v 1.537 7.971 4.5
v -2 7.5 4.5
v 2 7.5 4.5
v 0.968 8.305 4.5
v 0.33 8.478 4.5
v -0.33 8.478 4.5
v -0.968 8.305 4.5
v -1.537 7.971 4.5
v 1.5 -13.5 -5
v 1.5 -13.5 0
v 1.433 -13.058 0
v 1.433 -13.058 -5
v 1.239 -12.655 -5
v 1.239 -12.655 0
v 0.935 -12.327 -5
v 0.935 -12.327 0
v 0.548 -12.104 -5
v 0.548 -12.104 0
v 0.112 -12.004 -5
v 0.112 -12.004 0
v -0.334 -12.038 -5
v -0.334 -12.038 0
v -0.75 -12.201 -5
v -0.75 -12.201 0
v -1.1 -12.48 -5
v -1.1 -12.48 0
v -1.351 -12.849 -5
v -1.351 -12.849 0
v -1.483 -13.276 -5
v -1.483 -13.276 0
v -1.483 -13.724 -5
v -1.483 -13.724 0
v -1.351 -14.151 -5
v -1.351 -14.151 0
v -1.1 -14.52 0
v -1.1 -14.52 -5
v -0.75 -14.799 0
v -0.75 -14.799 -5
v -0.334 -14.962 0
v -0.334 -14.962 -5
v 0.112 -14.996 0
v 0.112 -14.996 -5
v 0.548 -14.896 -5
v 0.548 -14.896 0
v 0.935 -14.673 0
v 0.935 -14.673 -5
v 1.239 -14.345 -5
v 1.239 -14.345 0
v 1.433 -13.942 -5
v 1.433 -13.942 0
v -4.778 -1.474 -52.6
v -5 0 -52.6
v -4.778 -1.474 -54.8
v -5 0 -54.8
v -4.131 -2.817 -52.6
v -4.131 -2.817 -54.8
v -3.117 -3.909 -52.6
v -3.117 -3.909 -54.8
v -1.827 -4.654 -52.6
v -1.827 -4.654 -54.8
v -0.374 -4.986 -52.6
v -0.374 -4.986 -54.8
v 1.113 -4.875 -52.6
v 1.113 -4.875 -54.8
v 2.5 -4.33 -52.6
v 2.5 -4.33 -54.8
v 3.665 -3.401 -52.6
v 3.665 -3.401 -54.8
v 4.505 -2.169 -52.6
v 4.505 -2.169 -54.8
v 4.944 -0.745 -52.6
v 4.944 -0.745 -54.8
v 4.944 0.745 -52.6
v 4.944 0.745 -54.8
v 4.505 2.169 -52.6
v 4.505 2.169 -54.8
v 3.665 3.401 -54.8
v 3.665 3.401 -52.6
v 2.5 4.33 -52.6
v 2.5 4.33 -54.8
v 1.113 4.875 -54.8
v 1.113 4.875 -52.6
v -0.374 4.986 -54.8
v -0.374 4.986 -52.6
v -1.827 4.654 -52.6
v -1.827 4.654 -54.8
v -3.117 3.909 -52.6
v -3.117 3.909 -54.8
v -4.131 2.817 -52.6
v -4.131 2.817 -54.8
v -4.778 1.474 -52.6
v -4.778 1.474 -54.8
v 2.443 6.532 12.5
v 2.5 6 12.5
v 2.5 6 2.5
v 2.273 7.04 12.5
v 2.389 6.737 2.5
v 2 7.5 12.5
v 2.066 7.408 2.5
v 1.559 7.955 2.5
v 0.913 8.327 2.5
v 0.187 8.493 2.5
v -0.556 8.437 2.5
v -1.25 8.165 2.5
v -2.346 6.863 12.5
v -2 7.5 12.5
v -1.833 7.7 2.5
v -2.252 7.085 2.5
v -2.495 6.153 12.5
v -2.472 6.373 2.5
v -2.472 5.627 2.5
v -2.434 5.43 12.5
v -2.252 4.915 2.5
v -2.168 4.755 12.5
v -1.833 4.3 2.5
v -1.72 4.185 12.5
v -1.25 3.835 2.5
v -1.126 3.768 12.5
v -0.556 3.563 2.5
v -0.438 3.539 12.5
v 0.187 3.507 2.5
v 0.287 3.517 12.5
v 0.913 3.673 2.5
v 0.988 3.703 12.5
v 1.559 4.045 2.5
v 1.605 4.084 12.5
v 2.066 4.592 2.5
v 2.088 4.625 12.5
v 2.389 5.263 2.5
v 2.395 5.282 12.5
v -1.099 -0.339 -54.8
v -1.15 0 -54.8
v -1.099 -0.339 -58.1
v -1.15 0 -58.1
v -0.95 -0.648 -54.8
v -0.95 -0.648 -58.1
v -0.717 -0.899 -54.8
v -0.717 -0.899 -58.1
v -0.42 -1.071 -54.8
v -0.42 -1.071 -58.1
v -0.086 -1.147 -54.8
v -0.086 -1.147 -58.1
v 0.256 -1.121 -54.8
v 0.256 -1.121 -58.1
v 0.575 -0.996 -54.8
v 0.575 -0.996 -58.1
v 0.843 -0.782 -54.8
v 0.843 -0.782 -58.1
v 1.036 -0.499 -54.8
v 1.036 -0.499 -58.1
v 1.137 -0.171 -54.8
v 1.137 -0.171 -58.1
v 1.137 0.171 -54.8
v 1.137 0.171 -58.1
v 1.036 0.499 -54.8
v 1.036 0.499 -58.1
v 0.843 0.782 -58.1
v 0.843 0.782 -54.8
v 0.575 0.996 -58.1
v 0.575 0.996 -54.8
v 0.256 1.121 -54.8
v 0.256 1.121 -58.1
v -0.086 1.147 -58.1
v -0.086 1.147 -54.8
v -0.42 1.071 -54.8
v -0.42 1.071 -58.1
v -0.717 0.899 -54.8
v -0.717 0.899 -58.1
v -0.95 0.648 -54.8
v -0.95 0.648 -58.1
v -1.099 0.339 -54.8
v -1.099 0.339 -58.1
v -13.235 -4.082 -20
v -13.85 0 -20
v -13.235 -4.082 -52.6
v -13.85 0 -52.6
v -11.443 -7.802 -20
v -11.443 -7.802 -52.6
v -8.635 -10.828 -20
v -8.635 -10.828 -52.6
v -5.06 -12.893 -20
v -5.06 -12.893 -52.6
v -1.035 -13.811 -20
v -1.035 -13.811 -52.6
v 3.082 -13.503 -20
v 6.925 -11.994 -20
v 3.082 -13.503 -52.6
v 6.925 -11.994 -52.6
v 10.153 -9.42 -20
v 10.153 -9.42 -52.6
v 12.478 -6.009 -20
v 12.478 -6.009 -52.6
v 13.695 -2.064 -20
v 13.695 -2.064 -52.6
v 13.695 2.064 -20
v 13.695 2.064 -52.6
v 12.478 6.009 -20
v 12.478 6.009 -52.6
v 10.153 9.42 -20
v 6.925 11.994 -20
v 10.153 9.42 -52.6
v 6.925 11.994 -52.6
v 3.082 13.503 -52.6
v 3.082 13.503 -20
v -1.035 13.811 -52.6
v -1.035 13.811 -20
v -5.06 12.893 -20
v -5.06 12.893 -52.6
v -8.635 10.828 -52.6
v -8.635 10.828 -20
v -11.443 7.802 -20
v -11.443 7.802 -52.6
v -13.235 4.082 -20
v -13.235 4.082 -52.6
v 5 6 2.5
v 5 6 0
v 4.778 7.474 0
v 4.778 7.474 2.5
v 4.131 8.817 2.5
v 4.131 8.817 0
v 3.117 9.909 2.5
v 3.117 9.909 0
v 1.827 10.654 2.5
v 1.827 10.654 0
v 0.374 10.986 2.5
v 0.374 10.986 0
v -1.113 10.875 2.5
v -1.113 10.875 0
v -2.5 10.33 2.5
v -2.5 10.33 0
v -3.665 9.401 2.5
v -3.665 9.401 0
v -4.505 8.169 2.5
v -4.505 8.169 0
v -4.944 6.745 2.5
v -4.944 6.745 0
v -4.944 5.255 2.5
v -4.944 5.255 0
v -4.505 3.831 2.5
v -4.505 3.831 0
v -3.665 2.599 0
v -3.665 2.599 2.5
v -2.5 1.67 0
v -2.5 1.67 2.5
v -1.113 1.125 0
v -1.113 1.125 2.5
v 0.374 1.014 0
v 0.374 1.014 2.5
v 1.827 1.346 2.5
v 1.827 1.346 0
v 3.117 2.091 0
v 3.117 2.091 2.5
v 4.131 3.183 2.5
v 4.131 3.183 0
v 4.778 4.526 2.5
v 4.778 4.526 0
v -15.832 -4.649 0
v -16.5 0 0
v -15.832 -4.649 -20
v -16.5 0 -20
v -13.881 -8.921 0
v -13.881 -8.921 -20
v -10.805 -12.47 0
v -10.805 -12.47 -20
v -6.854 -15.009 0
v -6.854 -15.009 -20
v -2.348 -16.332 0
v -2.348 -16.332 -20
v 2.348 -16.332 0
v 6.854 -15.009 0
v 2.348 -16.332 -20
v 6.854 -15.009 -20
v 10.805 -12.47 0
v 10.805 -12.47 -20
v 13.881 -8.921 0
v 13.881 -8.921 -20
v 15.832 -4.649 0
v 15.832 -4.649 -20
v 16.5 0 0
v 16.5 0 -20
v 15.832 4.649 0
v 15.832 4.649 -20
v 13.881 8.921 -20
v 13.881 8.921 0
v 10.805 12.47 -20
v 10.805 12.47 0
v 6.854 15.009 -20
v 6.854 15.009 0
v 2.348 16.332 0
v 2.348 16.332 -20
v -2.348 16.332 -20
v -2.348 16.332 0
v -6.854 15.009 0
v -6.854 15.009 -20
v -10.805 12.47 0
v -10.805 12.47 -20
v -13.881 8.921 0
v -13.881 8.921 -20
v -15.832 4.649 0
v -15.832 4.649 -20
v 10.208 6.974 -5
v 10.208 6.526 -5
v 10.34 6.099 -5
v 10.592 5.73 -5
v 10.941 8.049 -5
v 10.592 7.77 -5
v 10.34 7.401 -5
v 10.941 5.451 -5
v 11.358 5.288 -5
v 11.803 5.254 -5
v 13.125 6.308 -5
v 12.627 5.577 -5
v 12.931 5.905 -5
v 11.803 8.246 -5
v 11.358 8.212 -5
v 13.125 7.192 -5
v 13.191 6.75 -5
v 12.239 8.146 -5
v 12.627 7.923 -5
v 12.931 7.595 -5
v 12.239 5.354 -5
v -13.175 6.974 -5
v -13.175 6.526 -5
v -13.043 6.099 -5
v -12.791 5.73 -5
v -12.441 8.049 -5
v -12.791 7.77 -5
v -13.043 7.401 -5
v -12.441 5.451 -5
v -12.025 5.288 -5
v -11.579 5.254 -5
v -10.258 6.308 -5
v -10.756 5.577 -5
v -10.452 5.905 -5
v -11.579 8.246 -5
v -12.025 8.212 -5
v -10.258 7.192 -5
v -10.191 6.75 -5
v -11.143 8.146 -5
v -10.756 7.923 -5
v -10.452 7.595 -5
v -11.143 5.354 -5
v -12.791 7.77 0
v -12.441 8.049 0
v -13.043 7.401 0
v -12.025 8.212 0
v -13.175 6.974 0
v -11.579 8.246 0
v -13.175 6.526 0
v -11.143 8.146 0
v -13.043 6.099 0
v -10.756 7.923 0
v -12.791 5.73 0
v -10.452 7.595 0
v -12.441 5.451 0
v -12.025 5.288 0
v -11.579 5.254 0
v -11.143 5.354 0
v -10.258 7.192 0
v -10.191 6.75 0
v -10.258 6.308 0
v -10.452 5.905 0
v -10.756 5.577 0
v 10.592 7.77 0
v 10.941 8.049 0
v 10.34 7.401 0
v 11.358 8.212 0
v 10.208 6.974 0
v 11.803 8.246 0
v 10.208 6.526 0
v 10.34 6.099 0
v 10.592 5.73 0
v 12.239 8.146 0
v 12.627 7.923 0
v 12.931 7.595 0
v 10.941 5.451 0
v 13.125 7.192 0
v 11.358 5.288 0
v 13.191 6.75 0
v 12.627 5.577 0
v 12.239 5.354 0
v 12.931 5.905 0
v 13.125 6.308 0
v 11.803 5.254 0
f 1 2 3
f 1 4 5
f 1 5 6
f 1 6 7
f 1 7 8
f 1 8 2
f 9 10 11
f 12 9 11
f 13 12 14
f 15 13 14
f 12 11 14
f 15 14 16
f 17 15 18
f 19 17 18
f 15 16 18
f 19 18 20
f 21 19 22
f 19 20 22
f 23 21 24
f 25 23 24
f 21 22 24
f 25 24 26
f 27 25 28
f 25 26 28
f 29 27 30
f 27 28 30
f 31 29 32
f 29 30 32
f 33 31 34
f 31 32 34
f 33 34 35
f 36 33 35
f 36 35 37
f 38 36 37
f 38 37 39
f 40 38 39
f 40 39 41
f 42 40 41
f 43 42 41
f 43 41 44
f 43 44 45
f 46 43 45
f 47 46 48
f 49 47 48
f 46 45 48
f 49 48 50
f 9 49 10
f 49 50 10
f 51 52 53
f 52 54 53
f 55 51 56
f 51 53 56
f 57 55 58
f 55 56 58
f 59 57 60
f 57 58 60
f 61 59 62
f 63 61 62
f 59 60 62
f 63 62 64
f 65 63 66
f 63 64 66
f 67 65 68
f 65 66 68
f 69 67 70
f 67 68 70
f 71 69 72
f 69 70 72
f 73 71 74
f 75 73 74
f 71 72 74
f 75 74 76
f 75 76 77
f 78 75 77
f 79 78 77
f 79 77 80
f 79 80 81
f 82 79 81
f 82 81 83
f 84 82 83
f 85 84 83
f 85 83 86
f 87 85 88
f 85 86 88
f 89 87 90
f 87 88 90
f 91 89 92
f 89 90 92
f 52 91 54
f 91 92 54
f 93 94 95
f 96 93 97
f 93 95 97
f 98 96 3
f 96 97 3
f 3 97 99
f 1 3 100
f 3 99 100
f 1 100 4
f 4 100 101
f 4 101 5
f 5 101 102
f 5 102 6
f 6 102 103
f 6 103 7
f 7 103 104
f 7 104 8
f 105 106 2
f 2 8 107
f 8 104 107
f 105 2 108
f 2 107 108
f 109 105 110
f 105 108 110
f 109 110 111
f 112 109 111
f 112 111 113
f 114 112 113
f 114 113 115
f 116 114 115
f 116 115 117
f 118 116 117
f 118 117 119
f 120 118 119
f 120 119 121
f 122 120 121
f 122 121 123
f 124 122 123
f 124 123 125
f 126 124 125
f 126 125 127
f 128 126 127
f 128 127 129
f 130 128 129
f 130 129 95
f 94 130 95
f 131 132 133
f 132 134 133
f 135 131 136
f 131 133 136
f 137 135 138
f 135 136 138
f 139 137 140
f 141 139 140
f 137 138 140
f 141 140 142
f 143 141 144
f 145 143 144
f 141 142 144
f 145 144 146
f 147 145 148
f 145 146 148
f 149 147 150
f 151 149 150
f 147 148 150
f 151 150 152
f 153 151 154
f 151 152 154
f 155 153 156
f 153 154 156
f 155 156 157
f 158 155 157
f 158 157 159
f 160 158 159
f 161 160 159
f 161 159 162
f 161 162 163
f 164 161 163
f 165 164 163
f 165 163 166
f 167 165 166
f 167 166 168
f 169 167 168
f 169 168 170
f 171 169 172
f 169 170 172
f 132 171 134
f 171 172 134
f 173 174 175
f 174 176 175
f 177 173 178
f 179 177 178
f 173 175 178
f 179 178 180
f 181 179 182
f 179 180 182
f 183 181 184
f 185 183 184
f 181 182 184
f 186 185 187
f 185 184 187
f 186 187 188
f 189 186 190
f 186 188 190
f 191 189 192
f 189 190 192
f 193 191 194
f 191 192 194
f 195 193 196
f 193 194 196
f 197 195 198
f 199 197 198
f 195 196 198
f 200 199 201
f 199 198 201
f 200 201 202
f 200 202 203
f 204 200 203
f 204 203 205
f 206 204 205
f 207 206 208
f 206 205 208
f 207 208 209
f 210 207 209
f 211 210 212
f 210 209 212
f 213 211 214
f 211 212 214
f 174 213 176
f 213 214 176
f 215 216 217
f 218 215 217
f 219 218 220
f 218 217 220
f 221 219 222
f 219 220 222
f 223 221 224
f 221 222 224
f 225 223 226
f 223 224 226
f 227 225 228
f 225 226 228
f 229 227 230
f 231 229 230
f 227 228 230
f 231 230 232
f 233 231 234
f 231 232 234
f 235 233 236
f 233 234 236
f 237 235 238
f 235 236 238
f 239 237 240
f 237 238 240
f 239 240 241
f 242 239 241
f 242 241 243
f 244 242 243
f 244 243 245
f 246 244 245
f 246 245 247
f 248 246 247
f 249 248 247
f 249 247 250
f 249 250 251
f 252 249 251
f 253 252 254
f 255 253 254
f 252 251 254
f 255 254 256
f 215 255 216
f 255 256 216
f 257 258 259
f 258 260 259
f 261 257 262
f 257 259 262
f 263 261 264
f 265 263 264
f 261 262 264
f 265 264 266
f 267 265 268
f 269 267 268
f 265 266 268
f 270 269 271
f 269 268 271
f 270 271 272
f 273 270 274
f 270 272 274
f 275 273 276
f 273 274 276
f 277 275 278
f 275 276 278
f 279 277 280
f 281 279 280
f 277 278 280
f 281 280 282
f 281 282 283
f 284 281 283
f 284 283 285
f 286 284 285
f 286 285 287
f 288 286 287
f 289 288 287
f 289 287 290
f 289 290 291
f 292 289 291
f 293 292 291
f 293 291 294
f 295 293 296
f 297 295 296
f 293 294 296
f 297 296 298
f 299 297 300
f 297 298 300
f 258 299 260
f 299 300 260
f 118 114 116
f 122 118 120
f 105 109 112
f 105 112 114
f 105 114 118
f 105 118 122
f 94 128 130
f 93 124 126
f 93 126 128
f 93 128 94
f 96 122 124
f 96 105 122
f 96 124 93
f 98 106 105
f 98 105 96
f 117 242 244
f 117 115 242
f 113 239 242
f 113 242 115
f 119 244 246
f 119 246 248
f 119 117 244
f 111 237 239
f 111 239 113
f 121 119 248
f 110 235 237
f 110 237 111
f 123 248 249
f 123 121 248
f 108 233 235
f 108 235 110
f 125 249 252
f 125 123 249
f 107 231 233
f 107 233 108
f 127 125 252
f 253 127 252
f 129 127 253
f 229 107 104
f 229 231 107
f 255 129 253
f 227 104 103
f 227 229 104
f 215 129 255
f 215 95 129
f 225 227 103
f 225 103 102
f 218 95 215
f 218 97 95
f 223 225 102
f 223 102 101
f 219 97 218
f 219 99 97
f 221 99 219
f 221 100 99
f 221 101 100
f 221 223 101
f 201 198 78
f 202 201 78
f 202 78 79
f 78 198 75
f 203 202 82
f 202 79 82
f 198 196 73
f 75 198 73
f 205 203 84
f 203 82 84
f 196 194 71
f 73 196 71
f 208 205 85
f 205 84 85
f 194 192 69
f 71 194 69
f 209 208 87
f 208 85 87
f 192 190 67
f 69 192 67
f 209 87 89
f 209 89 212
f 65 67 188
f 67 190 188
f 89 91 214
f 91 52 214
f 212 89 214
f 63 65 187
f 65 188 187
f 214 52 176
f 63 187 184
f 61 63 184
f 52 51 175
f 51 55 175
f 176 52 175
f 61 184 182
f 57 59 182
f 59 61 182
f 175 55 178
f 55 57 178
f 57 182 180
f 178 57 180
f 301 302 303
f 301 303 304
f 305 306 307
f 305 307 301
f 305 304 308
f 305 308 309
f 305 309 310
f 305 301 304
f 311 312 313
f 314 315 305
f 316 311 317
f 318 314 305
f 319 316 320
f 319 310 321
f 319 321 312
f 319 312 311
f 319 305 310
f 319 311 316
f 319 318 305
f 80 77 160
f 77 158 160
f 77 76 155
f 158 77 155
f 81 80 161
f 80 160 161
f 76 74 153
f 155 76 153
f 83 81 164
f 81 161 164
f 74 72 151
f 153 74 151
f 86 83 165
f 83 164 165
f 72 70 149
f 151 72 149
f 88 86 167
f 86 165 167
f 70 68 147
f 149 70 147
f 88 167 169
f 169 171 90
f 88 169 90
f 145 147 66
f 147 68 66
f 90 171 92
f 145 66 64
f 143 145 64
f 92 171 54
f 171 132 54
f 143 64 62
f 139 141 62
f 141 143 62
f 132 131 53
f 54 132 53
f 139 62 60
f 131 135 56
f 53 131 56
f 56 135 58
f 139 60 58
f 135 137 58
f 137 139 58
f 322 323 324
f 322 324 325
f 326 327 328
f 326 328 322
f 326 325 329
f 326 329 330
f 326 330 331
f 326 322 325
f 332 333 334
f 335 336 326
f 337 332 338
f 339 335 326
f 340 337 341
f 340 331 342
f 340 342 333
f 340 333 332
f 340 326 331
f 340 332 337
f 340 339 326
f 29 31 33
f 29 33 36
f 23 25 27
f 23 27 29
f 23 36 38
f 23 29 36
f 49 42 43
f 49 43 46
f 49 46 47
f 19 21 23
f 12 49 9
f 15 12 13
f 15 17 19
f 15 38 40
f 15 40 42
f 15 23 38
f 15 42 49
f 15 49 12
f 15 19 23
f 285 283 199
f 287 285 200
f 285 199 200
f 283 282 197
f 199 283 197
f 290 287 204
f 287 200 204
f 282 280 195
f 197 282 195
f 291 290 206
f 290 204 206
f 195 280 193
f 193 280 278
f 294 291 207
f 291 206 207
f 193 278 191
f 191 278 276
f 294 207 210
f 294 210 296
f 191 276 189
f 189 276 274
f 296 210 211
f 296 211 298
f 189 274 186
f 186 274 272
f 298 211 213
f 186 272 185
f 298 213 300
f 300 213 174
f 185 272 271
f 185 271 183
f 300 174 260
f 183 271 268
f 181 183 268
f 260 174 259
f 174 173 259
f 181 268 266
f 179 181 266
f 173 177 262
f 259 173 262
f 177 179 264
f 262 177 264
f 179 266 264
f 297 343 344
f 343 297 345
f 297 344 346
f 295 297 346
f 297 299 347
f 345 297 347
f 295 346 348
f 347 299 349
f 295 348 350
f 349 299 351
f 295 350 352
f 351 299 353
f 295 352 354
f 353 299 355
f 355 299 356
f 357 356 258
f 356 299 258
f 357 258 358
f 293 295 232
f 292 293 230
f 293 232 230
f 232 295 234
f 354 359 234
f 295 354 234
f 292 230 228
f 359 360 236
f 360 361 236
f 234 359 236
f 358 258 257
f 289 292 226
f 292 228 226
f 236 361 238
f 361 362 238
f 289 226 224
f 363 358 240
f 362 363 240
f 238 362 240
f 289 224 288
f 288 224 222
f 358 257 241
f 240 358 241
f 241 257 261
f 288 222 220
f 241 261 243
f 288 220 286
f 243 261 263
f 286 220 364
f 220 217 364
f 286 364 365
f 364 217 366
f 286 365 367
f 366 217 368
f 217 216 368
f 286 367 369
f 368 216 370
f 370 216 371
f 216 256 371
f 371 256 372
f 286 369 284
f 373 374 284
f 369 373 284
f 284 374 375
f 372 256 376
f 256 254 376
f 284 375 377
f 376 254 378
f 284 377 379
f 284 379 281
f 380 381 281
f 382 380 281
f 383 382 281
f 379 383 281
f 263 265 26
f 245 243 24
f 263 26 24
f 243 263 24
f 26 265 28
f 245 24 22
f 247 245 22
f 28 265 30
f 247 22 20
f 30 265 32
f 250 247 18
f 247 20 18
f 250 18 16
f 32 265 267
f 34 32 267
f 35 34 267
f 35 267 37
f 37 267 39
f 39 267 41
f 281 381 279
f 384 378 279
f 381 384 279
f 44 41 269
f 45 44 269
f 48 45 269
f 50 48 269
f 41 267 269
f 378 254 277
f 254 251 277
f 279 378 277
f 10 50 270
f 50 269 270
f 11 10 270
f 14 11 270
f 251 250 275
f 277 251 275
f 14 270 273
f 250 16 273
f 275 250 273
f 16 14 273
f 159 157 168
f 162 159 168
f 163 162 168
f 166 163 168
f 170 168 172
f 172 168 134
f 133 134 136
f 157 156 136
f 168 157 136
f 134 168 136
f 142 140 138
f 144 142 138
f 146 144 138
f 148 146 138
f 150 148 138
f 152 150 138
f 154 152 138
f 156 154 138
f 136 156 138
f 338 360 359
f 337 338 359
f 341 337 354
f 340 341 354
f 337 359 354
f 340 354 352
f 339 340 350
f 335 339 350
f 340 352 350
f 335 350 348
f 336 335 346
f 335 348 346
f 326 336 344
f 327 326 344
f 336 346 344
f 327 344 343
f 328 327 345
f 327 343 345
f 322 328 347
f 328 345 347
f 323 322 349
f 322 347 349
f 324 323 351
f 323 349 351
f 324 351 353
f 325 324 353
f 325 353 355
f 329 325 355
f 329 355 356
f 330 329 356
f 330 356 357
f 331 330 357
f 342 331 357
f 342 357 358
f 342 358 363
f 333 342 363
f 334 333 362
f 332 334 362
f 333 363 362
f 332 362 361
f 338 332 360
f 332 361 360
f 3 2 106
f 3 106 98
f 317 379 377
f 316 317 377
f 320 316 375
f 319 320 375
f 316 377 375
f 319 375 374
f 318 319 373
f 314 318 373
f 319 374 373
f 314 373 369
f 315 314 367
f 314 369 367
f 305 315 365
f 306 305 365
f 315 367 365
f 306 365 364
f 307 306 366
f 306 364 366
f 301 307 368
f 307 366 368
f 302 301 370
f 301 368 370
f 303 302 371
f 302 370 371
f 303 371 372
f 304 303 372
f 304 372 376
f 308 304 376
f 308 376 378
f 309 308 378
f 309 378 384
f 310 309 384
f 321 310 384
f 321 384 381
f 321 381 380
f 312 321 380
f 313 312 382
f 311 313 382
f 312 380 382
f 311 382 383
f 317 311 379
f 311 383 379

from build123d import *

# Parameters (mm, degrees)
SKETCH6_R           = 5
BOSS_EXTRUDE3_DEPTH = 2.5
SKETCH7_R           = 2.5
BOSS_EXTRUDE4_DEPTH = 10
CUT_EXTRUDE1_START  = -8
CUT_EXTRUDE1_DEPTH  = 8
SKETCH9_R           = 1.500000048
CUT_EXTRUDE2_DEPTH  = 5


with BuildPart() as part:
    # Sketch5 → Revolve1 (revolve)
    with BuildSketch(Plane(origin=(0, 0, 0), x_dir=(0, 0, -1), z_dir=(1, 0, 0)), mode=Mode.PRIVATE) as revolve1_sk:
        Polygon((0, 0), (0, 16.5), (20, 16.5), (20, 13.85), (52.6, 13.85), (52.6, 5), (54.8, 5), (54.8, 1.15), (58.1, 1.15), (58.1, 0), align=None)
    revolve(revolve1_sk.sketch.rotate(Axis((0, 0, 0), (0, 0, 1)), 90), axis=Axis((0, 0, 0), (0, 0, 1)))

    # Sketch6 → Boss-Extrude3 (add)
    with BuildSketch(Plane.XY):
        with Locations((0, 6)):
            Circle(SKETCH6_R)
    extrude(amount=BOSS_EXTRUDE3_DEPTH)

    # Sketch7 → Boss-Extrude4 (add)
    with BuildSketch(Plane.XY.offset(2.5)):
        with Locations((0, 6)):
            Circle(SKETCH7_R)
    extrude(amount=BOSS_EXTRUDE4_DEPTH)

    # Sketch8 → Cut-Extrude1 (cut)
    with BuildSketch(Plane.XY.offset(12.5).offset(CUT_EXTRUDE1_START)):
        with BuildLine():
            Line((-1.999999964, 7.500000048), (1.999999964, 7.500000048))
            ThreePointArc((1.999999964, 7.500000048), (0, 8.5), (-1.999999964, 7.500000048))
        make_face()
    extrude(amount=CUT_EXTRUDE1_DEPTH, mode=Mode.SUBTRACT)

    # Sketch9 → Cut-Extrude2 (cut)
    with BuildSketch(Plane.XY):
        with Locations((0, -13.5)):
            Circle(SKETCH9_R)
        with Locations((-11.691342951, 6.75)):
            Circle(SKETCH9_R)
        with Locations((11.691342951, 6.75)):
            Circle(SKETCH9_R)
    extrude(amount=-CUT_EXTRUDE2_DEPTH, mode=Mode.SUBTRACT)


solid = part.part
